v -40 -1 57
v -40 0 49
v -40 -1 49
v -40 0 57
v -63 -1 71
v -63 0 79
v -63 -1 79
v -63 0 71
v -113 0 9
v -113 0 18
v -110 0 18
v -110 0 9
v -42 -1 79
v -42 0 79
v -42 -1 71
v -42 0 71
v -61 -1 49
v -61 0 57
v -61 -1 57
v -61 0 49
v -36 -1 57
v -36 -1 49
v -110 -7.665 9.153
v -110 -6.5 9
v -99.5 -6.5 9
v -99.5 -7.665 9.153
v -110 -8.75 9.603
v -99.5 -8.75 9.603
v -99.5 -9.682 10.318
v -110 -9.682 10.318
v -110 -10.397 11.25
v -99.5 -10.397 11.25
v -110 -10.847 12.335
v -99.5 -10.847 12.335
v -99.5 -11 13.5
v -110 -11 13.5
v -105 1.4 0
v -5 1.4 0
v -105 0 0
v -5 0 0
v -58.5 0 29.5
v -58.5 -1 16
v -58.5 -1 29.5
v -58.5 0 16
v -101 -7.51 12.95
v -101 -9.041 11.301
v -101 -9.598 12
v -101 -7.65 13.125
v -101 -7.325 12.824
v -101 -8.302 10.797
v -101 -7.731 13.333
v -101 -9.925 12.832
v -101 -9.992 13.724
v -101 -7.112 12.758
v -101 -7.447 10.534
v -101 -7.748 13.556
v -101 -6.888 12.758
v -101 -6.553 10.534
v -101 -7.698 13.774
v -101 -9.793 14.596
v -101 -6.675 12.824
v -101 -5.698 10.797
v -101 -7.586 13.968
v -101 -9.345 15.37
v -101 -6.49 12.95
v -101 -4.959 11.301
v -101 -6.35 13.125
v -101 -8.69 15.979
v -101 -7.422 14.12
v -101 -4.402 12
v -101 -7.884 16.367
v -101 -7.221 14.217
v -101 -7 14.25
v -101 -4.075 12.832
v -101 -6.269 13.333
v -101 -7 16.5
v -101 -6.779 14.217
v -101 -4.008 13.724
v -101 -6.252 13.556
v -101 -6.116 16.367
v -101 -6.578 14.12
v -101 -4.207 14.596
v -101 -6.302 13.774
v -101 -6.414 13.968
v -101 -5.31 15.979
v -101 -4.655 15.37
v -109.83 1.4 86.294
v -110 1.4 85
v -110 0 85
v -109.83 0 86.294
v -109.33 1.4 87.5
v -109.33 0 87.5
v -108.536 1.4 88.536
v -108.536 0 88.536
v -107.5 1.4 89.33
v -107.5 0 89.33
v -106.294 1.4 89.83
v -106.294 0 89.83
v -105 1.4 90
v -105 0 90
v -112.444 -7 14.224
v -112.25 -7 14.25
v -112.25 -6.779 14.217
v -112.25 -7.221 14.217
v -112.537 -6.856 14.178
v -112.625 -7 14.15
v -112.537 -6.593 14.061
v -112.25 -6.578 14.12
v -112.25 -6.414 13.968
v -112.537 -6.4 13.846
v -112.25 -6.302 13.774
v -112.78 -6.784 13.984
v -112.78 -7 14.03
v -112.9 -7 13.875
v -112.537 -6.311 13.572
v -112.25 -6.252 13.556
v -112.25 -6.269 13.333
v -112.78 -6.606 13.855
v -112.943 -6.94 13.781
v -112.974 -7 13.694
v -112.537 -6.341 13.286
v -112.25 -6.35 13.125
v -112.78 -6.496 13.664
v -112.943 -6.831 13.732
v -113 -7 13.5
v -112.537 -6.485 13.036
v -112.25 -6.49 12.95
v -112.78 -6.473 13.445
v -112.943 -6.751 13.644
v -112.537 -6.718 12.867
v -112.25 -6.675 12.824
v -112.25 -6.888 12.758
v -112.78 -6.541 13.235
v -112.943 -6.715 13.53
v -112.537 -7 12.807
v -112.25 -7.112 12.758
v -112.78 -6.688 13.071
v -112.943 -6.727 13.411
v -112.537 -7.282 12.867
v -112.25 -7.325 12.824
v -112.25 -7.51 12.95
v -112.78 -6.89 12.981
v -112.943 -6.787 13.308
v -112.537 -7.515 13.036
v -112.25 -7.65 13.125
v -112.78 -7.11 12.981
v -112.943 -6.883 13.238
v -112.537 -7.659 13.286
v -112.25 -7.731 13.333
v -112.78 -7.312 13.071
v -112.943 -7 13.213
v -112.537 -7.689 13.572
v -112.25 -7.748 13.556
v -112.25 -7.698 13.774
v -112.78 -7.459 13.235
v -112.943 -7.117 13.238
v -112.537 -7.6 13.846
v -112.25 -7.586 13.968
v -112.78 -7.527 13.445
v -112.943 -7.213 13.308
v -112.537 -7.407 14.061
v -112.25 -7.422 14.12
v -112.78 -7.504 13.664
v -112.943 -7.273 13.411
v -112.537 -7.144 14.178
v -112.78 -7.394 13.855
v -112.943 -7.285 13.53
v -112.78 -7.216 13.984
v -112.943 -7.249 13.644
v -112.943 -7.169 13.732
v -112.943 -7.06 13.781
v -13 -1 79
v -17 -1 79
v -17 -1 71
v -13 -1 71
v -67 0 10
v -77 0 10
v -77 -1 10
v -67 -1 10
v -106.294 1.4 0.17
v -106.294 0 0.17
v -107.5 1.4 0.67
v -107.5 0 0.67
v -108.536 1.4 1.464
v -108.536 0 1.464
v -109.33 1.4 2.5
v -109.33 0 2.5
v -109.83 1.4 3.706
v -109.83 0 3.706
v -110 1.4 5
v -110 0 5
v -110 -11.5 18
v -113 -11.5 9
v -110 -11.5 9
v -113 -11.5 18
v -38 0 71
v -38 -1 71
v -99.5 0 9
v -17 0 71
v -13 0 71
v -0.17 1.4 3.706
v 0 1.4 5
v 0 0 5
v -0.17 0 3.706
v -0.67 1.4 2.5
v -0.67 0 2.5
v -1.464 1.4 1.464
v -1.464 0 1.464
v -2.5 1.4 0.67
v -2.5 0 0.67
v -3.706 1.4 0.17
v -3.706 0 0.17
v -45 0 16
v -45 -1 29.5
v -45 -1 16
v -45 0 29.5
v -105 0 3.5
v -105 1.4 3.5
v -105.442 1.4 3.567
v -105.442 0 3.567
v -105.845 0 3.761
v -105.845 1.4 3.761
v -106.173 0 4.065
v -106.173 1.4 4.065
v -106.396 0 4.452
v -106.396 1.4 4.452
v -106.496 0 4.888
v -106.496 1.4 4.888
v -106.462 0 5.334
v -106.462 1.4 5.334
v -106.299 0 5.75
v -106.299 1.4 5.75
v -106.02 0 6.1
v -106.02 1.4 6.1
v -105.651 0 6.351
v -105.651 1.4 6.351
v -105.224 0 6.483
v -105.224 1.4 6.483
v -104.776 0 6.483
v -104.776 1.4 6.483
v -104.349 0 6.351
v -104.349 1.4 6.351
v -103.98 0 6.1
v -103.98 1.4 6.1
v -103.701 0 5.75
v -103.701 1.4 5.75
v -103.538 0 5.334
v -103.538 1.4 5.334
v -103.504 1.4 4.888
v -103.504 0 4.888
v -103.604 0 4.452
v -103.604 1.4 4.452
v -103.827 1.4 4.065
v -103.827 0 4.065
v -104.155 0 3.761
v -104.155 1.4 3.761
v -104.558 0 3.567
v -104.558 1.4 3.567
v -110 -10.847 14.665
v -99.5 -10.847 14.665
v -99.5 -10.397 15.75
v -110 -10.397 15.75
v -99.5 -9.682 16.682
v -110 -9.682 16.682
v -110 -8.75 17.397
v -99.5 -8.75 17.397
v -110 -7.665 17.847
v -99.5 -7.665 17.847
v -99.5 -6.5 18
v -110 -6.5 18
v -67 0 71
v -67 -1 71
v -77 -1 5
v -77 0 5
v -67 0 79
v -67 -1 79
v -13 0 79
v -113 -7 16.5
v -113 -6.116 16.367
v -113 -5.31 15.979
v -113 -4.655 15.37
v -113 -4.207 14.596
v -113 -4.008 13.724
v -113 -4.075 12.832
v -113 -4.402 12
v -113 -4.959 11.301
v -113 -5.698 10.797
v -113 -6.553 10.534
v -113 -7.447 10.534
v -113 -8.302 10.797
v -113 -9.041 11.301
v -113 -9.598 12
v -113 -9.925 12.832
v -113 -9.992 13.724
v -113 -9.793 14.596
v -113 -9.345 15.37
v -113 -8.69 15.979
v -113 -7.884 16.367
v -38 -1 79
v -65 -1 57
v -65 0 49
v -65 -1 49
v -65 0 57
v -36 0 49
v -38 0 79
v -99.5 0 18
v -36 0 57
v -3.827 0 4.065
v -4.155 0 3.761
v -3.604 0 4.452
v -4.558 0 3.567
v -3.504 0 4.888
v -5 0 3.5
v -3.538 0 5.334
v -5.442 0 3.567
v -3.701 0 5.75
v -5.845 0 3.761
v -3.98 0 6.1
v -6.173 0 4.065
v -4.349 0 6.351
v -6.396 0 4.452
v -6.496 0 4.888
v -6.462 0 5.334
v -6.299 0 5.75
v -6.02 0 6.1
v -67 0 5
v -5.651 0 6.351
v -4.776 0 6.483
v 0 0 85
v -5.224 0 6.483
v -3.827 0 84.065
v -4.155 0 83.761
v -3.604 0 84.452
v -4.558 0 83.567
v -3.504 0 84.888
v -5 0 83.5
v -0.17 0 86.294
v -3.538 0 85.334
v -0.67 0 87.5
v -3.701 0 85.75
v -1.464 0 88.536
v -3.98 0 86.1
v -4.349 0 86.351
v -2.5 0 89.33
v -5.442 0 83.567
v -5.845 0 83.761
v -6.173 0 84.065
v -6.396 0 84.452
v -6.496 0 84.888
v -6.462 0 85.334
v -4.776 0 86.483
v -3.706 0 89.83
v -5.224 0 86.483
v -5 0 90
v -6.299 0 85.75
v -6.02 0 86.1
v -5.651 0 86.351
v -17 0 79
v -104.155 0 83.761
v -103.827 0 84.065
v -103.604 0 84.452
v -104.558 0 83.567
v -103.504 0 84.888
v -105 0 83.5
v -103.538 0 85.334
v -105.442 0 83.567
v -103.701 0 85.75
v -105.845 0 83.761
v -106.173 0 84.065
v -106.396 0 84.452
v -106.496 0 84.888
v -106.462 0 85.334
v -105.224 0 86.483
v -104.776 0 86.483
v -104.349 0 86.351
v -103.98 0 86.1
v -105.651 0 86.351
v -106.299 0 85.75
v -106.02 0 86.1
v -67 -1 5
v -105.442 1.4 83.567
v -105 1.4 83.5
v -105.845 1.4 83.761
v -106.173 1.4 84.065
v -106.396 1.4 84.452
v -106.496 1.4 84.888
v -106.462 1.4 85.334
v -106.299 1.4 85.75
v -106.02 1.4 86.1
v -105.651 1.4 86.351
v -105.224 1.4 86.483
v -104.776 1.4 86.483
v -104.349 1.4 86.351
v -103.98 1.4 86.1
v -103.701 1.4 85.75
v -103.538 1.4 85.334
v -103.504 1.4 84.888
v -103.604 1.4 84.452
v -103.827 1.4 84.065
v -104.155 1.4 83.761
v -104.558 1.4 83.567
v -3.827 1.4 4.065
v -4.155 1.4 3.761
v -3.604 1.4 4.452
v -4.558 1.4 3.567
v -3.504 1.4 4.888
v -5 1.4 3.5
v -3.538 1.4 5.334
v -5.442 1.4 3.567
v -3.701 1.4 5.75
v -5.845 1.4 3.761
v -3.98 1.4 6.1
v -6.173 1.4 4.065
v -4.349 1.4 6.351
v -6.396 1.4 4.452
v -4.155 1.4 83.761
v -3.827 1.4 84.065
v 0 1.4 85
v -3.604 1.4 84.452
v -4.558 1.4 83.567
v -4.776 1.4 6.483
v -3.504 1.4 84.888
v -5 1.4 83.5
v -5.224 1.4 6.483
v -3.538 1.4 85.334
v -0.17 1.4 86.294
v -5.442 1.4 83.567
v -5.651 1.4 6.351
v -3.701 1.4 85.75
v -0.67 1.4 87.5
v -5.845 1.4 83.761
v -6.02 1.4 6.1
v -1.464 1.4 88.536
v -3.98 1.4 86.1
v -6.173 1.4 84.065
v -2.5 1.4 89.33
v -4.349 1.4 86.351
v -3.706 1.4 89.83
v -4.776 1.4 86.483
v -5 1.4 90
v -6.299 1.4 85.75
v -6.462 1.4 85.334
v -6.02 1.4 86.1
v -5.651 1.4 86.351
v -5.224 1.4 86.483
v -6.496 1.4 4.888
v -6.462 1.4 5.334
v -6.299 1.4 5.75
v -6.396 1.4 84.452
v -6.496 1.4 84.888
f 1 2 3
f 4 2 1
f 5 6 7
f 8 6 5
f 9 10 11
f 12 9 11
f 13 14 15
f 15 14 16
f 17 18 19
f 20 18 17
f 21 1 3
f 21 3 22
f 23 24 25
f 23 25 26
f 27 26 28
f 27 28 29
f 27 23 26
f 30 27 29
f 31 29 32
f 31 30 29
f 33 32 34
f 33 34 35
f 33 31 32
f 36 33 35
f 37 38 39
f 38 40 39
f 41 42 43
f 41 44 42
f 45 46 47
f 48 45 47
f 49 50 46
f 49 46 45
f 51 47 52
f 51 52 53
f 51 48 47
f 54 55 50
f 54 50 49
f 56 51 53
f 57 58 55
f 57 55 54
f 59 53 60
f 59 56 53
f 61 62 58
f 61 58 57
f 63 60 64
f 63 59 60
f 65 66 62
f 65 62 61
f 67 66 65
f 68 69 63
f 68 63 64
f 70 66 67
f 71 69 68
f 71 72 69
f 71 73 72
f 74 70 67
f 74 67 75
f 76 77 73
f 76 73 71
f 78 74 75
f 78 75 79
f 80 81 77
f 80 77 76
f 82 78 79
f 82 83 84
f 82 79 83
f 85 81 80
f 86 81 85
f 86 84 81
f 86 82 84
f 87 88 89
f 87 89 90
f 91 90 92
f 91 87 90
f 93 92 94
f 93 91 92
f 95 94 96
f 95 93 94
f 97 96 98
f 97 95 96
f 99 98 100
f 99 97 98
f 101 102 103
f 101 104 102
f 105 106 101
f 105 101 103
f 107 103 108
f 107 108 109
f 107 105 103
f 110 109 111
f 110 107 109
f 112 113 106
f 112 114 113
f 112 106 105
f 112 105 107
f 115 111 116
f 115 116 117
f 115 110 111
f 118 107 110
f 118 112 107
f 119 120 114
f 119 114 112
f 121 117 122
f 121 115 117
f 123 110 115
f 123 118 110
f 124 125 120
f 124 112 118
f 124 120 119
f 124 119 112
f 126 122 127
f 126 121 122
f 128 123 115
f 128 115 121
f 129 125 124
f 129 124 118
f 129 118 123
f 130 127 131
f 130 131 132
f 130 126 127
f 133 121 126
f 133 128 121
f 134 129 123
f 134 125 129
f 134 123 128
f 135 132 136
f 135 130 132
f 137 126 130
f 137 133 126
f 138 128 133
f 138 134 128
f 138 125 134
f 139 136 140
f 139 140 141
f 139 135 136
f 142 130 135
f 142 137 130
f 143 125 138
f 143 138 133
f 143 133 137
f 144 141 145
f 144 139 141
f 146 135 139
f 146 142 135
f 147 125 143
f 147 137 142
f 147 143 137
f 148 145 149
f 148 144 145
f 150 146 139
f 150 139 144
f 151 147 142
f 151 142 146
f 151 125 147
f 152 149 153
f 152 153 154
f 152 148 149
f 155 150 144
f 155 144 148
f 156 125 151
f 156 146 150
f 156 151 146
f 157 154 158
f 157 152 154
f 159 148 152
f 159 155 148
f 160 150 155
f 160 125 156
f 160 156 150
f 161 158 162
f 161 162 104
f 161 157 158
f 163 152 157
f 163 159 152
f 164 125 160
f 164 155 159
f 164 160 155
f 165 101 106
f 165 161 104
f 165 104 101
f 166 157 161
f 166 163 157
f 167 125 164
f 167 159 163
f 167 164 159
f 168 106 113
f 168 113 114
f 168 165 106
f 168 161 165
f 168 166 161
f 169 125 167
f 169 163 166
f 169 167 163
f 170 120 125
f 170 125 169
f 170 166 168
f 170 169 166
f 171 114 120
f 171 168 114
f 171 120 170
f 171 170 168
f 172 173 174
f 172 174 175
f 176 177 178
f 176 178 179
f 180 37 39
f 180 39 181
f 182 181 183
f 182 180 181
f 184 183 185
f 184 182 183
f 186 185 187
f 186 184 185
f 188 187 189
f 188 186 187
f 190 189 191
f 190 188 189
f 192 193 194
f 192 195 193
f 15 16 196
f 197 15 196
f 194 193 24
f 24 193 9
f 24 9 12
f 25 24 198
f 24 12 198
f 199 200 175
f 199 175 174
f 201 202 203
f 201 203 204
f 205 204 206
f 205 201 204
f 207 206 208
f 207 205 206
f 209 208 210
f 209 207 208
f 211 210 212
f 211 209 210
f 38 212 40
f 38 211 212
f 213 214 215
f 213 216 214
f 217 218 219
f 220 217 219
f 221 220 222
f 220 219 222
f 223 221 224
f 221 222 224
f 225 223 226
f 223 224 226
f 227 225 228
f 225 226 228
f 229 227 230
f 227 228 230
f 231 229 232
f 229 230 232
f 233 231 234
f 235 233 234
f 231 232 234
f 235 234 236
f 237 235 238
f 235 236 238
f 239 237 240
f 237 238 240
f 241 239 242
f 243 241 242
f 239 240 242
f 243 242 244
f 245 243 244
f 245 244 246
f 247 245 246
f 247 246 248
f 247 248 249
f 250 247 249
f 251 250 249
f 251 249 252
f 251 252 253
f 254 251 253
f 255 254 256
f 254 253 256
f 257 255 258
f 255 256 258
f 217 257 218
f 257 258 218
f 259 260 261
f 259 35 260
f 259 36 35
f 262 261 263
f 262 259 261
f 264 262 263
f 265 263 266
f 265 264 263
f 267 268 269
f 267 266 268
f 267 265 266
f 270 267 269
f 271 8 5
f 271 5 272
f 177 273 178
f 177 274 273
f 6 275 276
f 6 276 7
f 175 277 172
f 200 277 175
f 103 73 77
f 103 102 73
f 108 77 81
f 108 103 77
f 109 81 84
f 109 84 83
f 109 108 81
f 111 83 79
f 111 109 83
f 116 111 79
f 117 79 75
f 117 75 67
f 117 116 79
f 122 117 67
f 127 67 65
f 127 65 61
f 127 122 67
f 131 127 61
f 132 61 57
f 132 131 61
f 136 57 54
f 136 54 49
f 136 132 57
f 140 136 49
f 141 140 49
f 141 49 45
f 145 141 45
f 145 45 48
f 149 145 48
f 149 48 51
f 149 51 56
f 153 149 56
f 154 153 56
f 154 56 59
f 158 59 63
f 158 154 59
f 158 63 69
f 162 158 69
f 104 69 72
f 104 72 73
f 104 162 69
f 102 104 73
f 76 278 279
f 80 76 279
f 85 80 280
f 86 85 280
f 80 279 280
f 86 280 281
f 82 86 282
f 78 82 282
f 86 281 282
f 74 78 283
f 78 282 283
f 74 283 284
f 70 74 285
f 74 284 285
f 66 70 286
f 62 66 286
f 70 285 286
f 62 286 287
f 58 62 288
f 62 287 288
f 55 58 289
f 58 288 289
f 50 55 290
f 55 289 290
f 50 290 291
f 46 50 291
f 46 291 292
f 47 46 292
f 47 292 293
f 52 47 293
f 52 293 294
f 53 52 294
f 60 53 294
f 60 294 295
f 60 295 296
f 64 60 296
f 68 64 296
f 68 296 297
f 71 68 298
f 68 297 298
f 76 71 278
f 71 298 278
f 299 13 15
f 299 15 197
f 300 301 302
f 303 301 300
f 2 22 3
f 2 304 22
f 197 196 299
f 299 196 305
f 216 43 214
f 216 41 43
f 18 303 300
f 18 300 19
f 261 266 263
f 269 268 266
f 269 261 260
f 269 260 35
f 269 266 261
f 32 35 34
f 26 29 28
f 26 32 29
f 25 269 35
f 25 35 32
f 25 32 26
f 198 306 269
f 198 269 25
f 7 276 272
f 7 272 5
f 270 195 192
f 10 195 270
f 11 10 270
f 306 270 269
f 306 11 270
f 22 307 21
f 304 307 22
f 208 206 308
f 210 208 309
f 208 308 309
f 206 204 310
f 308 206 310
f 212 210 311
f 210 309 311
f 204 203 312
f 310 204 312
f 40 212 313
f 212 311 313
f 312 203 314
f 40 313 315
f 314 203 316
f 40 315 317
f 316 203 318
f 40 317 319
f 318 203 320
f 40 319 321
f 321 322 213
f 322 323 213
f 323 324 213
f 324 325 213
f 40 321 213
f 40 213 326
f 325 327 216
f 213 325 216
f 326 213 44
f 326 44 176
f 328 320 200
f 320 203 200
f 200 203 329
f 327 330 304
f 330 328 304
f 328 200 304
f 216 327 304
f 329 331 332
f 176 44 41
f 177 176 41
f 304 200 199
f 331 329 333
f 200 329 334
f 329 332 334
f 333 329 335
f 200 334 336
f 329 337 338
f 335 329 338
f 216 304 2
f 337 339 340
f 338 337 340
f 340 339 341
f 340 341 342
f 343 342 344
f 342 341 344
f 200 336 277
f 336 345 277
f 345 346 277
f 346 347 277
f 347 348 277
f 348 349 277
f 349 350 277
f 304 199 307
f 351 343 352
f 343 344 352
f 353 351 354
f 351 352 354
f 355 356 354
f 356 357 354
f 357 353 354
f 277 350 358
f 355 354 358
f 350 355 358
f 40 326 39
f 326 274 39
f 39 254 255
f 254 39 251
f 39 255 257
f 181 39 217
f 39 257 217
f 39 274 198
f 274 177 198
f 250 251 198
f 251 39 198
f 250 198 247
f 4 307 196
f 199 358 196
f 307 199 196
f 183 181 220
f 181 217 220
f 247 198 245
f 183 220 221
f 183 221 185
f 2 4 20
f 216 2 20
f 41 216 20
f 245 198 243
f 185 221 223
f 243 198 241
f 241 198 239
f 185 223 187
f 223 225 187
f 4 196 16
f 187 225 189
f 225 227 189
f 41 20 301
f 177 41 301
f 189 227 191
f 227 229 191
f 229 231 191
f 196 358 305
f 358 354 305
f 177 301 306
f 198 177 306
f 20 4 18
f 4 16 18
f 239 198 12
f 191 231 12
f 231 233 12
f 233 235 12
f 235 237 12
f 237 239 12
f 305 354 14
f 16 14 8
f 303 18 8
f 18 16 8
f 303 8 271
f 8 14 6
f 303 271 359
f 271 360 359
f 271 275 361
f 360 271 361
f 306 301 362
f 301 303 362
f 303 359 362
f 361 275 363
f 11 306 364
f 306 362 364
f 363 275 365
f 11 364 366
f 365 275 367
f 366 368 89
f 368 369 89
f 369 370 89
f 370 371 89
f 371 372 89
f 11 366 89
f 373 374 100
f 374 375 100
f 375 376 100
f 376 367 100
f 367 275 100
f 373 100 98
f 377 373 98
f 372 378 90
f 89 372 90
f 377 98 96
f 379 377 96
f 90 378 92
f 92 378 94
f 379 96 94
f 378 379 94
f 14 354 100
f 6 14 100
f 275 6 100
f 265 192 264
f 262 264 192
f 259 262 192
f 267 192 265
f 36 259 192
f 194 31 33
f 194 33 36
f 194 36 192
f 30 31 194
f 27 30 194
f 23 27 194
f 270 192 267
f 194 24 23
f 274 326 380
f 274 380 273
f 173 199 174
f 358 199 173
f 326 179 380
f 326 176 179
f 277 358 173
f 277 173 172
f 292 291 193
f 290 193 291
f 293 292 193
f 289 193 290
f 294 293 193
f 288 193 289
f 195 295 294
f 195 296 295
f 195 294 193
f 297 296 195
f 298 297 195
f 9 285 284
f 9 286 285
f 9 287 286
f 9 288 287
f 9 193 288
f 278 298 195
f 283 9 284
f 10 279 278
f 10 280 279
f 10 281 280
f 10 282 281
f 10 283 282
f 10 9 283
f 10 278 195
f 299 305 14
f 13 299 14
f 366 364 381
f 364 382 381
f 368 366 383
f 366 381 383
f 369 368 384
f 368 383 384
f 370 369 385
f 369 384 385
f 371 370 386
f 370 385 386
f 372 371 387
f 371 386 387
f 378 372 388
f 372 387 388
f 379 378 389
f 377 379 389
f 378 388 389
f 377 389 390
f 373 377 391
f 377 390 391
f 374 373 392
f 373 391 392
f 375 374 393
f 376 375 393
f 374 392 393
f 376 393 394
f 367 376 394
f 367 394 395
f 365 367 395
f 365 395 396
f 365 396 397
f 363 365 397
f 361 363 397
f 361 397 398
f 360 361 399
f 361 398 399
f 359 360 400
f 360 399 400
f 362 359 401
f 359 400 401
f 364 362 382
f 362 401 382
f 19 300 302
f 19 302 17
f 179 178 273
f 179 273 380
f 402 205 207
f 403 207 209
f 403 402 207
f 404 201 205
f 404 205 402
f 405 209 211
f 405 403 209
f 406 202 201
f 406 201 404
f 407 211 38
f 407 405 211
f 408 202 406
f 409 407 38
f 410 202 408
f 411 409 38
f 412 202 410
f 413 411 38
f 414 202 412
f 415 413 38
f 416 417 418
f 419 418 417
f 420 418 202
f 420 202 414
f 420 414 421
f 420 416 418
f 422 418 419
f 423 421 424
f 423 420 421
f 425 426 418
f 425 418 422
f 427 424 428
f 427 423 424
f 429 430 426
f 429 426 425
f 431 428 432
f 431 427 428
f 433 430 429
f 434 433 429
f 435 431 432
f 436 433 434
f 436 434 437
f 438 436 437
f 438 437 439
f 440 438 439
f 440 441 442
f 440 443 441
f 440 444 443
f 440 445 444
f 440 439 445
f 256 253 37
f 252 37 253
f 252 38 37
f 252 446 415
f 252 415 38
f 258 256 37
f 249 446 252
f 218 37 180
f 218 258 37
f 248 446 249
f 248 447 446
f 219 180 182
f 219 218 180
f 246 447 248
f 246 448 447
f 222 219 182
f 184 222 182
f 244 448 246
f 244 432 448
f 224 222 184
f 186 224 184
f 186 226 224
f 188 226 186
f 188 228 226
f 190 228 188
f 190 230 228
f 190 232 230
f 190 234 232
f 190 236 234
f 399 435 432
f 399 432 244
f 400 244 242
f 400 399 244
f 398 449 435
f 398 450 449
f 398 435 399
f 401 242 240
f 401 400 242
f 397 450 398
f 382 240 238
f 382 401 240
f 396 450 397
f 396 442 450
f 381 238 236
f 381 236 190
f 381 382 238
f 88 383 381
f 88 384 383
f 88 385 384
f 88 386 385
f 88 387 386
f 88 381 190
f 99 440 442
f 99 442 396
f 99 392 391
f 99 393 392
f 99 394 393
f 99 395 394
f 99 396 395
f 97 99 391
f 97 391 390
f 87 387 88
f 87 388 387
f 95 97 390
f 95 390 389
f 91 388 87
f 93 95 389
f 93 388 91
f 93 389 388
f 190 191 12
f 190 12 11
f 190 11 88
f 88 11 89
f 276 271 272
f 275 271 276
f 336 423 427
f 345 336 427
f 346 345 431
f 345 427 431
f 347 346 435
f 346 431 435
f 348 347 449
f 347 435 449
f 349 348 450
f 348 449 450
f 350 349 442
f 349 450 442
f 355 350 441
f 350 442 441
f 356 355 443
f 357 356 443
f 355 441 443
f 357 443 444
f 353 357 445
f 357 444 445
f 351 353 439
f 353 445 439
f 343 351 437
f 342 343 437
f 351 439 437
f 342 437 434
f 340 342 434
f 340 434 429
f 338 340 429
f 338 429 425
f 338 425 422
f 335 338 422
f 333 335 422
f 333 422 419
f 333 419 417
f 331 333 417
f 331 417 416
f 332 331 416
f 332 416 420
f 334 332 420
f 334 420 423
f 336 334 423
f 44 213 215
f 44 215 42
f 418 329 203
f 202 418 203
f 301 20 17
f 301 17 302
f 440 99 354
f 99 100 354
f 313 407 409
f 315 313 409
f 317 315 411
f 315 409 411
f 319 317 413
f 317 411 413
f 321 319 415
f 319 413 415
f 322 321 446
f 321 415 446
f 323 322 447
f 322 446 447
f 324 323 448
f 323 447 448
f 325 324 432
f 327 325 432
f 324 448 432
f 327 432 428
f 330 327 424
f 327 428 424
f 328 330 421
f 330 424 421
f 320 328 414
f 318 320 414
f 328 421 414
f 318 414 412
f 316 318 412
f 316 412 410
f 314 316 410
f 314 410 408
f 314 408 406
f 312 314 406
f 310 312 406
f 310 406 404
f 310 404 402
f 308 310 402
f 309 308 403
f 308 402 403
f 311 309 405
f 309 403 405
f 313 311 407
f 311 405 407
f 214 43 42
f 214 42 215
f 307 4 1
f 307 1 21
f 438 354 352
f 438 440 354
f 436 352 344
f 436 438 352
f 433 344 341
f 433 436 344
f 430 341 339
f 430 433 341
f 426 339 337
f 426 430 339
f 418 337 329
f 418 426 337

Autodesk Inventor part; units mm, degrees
ref_plane "YZ Plane" through (0, 0, 0) normal (1, 0, 0) x (0, 1, 0)
ref_plane "XZ Plane" through (0, 0, 0) normal (0, 1, 0) x (-1, 0, 0)
ref_plane "XY Plane" through (0, 0, 0) normal (0, 0, 1) x (1, 0, 0)
sketch "草圖1" plane through (0, 0, 0) normal (0, 1, 0) x (-1, 0, 0)
  line L0 (0, 0) -> (110, 0)
  line L1 (110, 0) -> (110, 90)
  line L2 (110, 90) -> (0, 90)
  line L3 (0, 90) -> (0, 0)
  dimension "d0" = 110
  dimension "d1" = 90
extrude "擠出1" add sketch "草圖1" along normal blind 1.4
fillet "圓角1" radius 5 4 edges at (0, 0.7, 90) (0, 0.7, 0) (-110, 0.7, 90) (-110, 0.7, 0)
sketch "草圖2" plane through (0, 0, 0) normal (0, -1, 0) x (1, 0, 0)
  line L0 (-5, 0) -> (-105, 0) projected
  line L1 (0, 85) -> (0, 5) projected
  line L2 (-105, 90) -> (-5, 90) projected
  line L3 (-110, 5) -> (-110, 85) projected
  point P0 (0, 0)
  point P1 (-105, 85)
  point P2 (-105, 5)
  point P3 (-5, 85)
  point P4 (-5, 5)
  dimension "d5" = 5
  dimension "d6" = 5
  dimension "d7" = 5
  dimension "d8" = 5
hole "孔1" at (-105, 0, 85) at (-105, 0, 5) at (-5, 0, 85) at (-5, 0, 5) direction (0, 1, 0) diameter 3 end through all
sketch "草圖3" plane through (0, 0, 0) normal (0, -1, 0) x (1, 0, 0)
  line L0 (-5, 0) -> (-105, 0) projected
  line L1 (-110, 5) -> (-110, 85) projected
  line L2 (-113, 18) -> (-99.5, 18)
  line L3 (-99.5, 18) -> (-99.5, 9)
  line L4 (-99.5, 9) -> (-113, 9)
  line L5 (-113, 9) -> (-113, 18)
  point P0 (0, 0)
  dimension "d16" = 9
  dimension "d17" = 9
  dimension "d18" = 13.5
  dimension "d19" = 3
extrude "擠出2" add sketch "草圖3" along normal blind 11
sketch "草圖5" plane through (0, -11, 0) normal (0, -1, 0) x (1, 0, 0)
  line L0 (-113, 9) -> (-99.5, 9) projected
  line L1 (-113, 18) -> (-110, 18)
  line L2 (-110, 18) -> (-110, 9)
  line L3 (-110, 9) -> (-113, 9)
  line L4 (-113, 9) -> (-113, 18)
  point P0 (0, 0)
  dimension "d23" = 3
extrude "擠出3" add sketch "草圖5" along normal blind 0.5
fillet "圓角2" radius 4.5 2 edges at (-104.75, -11, 18) (-104.75, -11, 9)
sketch "草圖7" plane through (-113, 0, 9) normal (-1, 0, 0) x (0, 0, 1)
  line L0 (9, -11.5) -> (0, -11.5) projected
  circle A0 centre (4.5, -7) radius 3
  circle A1 centre (4.5, -7) radius 0.75
  point P0 (-9, 0)
  dimension "d35" = 4.5
  dimension "d36" = 1.5
  dimension "d37" = 6
extrude "擠出4" cut sketch "草圖7" against normal blind 12
fillet "圓角3" radius 0.75 1 edges at (-113, -7, 12.75)
sketch "草圖8" plane through (0, 0, 0) normal (0, -1, 0) x (1, 0, 0)
  line L0 (-5, 0) -> (-105, 0) projected
  line L1 (0, 85) -> (0, 5) projected
  line L2 (-105, 90) -> (-5, 90) projected
  line L3 (-110, 18) -> (-110, 85) projected
  line L4 (-58.5, 29.5) -> (-45, 29.5)
  line L5 (-45, 29.5) -> (-45, 16)
  line L6 (-45, 16) -> (-58.5, 16)
  line L7 (-58.5, 16) -> (-58.5, 29.5)
  line L8 (-77, 10) -> (-67, 10)
  line L9 (-67, 10) -> (-67, 5)
  line L10 (-67, 5) -> (-77, 5)
  line L11 (-77, 5) -> (-77, 10)
  line L12 (-17, 79) -> (-13, 79)
  line L13 (-13, 79) -> (-13, 71)
  line L14 (-13, 71) -> (-17, 71)
  line L15 (-17, 71) -> (-17, 79)
  line L16 (-38, 79) -> (-42, 79)
  line L17 (-42, 79) -> (-42, 71)
  line L18 (-42, 71) -> (-38, 71)
  line L19 (-38, 71) -> (-38, 79)
  line L20 (-63, 71) -> (-67, 71)
  line L21 (-67, 71) -> (-67, 79)
  line L22 (-67, 79) -> (-63, 79)
  line L23 (-63, 79) -> (-63, 71)
  line L24 (-40, 57) -> (-36, 57)
  line L25 (-36, 57) -> (-36, 49)
  line L26 (-36, 49) -> (-40, 49)
  line L27 (-40, 49) -> (-40, 57)
  line L28 (-65, 57) -> (-61, 57)
  line L29 (-61, 57) -> (-61, 49)
  line L30 (-61, 49) -> (-65, 49)
  line L31 (-65, 49) -> (-65, 57)
  point P0 (0, 0)
  dimension "d41" = 13.5
  dimension "d43" = 13.5
  dimension "d44" = 51.5
  dimension "d45" = 16
  dimension "d46" = 10
  dimension "d47" = 5
  dimension "d48" = 33
  dimension "d49" = 5
  dimension "d50" = 4
  dimension "d51" = 8
  dimension "d52" = 13
  dimension "d53" = 11
  dimension "d54" = 4
  dimension "d55" = 4
  dimension "d56" = 21
  dimension "d57" = 21
  dimension "d58" = 4
  dimension "d59" = 8
  dimension "d60" = 2
  dimension "d61" = 14
  dimension "d62" = 4
  dimension "d63" = 21
extrude "擠出5" add sketch "草圖8" along normal blind 1
properties part number "pcb"
